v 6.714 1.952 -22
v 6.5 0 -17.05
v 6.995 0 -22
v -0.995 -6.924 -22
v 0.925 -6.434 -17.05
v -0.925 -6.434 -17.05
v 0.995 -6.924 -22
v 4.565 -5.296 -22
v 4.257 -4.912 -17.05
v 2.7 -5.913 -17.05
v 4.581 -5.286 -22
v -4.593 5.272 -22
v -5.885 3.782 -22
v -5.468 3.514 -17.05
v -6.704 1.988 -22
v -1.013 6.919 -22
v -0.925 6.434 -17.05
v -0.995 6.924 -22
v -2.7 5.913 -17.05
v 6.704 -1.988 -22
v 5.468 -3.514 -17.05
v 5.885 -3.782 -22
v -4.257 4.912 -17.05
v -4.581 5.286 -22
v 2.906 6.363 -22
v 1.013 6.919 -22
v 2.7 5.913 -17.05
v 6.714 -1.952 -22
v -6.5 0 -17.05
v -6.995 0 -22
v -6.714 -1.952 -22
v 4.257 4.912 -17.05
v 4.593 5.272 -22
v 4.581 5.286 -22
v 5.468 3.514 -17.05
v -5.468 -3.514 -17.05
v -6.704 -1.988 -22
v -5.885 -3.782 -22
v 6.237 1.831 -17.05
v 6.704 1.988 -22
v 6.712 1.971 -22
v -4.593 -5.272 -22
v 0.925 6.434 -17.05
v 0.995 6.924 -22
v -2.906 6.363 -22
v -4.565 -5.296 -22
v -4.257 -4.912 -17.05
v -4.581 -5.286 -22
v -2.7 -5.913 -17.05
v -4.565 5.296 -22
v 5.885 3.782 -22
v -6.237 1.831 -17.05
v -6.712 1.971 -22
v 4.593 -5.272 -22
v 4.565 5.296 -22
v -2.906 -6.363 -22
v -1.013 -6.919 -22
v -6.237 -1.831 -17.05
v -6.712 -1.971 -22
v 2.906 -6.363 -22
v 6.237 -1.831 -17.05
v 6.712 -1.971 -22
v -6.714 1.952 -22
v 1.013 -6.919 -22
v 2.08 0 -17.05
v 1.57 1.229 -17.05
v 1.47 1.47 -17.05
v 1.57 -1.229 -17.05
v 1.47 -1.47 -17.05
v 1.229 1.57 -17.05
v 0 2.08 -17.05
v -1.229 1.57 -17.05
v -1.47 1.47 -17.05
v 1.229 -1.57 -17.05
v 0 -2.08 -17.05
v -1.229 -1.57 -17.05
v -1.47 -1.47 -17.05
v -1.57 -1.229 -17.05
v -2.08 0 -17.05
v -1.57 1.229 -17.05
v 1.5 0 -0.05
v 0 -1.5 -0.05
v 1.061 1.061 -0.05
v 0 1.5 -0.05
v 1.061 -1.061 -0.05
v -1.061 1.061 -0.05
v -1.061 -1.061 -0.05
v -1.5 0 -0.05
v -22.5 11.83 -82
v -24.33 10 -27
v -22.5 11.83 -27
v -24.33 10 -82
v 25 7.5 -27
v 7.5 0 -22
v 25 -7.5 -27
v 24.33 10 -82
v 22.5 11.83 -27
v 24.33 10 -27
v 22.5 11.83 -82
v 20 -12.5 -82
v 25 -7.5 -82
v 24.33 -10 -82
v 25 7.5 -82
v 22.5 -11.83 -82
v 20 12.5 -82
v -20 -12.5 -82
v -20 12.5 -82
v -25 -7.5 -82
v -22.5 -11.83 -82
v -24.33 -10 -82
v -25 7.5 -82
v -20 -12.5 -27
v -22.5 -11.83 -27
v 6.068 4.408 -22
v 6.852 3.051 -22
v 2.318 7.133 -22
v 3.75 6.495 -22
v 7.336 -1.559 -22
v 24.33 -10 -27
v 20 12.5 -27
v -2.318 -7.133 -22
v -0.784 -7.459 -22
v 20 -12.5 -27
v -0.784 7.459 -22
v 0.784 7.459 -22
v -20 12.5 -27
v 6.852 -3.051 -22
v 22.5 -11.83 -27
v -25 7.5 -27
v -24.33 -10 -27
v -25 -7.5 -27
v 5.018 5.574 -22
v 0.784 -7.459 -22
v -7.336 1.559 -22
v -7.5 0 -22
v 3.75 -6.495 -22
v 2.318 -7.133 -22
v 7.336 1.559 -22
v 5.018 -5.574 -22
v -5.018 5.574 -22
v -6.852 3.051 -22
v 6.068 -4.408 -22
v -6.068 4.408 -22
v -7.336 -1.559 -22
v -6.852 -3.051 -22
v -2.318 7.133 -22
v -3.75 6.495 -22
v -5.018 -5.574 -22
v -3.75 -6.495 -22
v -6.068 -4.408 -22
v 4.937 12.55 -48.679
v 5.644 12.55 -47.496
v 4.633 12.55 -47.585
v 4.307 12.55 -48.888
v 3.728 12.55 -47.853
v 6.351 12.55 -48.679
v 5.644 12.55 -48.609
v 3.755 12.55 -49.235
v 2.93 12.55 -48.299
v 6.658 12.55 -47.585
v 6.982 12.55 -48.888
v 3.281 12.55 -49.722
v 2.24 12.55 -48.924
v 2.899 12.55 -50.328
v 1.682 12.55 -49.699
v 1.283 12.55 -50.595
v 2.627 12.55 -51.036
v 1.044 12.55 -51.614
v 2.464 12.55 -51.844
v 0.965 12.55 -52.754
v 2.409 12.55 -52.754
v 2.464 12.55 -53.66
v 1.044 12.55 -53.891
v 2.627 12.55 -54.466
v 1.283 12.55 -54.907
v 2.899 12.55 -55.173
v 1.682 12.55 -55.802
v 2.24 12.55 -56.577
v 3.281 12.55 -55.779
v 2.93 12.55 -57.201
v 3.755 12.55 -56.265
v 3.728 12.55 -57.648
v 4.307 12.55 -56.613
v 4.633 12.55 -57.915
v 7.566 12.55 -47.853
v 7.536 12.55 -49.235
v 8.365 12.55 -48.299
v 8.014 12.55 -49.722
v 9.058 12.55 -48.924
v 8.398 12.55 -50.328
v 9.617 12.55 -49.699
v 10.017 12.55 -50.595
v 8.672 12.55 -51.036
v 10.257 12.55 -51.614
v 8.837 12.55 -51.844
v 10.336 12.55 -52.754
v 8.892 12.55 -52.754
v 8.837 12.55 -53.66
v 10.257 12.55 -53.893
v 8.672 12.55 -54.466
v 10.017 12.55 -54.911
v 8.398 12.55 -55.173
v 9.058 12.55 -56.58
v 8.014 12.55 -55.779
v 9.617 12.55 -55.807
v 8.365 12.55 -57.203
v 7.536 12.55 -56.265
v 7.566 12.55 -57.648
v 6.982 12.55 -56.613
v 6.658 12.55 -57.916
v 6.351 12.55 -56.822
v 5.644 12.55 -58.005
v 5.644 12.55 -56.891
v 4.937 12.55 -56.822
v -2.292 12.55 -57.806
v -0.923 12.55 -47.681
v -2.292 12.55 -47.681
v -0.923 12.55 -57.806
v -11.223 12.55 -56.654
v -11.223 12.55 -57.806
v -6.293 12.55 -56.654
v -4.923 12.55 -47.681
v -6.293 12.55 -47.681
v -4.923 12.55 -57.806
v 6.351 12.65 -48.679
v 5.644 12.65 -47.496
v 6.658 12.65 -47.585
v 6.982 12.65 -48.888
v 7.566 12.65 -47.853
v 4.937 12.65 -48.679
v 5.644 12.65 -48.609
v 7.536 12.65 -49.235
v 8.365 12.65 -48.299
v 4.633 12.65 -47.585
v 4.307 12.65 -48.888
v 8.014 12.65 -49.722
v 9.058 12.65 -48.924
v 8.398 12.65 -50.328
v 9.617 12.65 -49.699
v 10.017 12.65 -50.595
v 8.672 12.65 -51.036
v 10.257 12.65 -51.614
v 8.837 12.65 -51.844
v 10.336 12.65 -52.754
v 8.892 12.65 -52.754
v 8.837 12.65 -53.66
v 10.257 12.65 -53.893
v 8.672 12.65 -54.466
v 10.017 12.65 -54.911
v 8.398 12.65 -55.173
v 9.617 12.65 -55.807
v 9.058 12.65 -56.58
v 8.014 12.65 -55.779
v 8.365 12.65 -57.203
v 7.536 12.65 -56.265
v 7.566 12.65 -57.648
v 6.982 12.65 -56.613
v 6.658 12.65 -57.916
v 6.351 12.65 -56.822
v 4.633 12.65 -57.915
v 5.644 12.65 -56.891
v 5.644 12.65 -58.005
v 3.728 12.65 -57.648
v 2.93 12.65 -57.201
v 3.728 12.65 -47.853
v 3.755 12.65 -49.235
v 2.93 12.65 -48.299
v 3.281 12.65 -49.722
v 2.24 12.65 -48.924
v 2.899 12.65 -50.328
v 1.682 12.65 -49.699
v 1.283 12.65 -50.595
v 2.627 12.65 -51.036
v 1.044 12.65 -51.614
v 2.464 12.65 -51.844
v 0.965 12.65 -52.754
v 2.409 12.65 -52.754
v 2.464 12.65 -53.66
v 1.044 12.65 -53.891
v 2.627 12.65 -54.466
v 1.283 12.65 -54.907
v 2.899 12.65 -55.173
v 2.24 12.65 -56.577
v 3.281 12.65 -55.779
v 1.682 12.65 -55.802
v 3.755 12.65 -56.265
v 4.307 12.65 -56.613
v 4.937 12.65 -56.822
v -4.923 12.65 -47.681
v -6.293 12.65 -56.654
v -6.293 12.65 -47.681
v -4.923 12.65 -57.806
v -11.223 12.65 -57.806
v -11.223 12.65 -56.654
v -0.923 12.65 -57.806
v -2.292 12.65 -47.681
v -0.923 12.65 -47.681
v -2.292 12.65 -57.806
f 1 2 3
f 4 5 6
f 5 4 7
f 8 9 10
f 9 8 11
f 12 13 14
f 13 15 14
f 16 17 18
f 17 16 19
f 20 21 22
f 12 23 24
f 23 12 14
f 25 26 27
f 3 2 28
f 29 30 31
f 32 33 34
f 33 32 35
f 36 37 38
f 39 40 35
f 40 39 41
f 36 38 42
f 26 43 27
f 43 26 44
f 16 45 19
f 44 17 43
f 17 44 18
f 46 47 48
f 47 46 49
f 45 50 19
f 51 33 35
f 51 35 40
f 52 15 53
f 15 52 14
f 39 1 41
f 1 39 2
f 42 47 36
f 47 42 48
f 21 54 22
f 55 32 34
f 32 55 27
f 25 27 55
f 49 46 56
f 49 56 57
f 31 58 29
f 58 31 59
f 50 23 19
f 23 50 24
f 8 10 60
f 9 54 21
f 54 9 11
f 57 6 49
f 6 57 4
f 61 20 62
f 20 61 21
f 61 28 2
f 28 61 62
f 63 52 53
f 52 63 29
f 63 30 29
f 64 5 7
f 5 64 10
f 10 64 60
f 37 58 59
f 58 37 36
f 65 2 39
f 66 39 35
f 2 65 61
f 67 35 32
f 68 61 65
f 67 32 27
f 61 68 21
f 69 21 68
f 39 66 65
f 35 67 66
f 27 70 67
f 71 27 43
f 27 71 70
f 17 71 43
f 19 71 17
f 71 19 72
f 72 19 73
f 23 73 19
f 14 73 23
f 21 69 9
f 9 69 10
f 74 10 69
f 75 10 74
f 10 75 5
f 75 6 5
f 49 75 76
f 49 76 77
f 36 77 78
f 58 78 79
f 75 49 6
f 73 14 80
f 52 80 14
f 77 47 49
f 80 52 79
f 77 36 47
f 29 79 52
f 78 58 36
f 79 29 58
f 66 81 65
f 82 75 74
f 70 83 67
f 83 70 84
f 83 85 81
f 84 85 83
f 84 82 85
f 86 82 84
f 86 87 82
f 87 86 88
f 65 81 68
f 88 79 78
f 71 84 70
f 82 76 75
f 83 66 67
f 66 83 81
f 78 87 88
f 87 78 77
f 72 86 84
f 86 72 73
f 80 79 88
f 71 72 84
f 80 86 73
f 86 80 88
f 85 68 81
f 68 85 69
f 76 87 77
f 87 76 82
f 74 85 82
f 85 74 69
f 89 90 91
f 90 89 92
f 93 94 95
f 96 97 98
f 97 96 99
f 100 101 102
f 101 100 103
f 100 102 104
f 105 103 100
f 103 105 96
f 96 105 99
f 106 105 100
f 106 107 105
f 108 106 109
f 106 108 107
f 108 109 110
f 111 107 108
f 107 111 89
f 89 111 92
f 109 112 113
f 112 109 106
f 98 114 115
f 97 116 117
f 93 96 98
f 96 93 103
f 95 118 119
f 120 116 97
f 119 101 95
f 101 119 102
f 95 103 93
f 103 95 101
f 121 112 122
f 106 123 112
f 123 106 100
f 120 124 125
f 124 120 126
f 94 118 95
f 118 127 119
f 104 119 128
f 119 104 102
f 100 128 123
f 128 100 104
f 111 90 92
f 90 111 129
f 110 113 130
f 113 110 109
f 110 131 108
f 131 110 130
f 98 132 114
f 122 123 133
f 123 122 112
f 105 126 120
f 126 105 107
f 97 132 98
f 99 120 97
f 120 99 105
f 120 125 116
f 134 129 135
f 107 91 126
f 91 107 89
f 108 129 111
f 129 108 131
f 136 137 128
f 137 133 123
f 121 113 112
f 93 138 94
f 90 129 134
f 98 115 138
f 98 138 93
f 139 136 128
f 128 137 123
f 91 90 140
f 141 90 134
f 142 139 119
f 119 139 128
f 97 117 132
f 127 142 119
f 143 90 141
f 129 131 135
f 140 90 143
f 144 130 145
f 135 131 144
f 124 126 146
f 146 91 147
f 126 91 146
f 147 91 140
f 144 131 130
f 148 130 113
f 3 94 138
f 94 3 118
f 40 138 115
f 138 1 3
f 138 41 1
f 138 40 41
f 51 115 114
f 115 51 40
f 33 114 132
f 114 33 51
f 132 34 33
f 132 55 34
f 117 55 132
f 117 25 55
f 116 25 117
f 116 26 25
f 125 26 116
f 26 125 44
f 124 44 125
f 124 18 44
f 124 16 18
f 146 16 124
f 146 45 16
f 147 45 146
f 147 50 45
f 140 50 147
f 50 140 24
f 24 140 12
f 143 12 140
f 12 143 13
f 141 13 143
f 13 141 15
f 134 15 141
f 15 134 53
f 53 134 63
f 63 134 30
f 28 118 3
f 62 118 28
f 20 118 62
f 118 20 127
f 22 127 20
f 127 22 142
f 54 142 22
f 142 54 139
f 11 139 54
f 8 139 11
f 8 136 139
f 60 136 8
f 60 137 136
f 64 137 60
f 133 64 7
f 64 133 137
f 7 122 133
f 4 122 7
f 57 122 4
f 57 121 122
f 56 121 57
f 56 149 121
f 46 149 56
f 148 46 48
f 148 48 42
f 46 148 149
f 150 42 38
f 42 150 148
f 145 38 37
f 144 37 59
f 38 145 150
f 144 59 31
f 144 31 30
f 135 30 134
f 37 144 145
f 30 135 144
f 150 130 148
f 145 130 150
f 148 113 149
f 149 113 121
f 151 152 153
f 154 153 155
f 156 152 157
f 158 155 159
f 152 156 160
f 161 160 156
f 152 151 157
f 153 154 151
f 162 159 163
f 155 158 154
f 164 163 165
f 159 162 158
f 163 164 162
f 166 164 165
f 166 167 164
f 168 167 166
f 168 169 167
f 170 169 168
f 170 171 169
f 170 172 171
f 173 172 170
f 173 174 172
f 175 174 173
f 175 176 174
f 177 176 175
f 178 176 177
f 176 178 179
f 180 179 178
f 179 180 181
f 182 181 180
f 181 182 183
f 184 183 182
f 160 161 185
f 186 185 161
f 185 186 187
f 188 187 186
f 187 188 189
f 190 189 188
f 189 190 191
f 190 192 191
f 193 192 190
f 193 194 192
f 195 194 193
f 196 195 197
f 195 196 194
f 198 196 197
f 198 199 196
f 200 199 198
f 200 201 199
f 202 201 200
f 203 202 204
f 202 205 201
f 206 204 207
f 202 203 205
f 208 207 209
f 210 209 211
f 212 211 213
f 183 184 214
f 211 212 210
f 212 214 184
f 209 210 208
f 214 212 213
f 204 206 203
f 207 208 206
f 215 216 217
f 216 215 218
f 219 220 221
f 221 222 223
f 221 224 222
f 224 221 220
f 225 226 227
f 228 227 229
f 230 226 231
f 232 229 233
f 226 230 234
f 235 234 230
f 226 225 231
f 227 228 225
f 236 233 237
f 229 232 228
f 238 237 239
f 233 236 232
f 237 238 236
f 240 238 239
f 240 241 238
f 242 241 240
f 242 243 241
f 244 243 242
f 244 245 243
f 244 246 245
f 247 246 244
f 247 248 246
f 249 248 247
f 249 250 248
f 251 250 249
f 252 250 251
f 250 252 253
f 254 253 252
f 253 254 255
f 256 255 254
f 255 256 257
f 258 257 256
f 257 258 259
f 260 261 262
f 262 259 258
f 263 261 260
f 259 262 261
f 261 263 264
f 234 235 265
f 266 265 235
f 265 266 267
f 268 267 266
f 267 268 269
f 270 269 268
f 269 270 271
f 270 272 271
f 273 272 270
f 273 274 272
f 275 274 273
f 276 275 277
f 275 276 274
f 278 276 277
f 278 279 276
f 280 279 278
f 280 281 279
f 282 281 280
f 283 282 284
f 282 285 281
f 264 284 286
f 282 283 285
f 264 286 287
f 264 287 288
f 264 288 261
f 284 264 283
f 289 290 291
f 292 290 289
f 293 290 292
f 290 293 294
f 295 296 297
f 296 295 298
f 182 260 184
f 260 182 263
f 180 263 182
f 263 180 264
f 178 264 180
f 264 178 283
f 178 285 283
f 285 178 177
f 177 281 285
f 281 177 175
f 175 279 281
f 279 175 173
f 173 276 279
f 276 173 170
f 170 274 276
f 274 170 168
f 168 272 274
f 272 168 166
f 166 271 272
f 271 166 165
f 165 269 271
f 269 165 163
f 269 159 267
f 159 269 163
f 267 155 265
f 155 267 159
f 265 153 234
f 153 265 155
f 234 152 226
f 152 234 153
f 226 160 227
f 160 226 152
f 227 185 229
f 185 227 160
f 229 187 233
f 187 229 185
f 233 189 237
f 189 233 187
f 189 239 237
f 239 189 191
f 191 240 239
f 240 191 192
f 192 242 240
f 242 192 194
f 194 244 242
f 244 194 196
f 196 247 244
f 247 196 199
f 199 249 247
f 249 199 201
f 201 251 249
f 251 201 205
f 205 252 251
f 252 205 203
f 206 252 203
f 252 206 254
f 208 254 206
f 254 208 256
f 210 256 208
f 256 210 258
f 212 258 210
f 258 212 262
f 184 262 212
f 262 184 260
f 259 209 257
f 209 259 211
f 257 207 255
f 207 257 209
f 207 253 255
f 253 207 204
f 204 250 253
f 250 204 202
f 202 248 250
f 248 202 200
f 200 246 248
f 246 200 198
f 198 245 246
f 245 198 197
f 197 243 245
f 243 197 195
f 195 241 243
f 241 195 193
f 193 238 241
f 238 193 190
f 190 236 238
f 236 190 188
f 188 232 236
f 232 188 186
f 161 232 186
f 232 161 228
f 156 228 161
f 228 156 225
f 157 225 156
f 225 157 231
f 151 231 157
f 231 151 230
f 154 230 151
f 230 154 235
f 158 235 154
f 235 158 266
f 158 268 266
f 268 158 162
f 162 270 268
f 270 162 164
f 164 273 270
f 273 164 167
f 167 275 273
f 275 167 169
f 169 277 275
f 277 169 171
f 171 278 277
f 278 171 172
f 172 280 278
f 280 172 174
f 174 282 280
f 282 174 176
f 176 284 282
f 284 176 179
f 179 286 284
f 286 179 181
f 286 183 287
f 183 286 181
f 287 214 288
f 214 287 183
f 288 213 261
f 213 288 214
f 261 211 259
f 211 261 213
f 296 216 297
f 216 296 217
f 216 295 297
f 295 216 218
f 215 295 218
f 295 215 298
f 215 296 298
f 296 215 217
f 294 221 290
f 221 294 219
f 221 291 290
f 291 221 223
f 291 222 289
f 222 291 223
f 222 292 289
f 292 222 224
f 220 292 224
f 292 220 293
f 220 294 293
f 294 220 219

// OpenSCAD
// file: ../../openscad/libs/libdict.scad
// This library add dictionary like features to openscad
// the dictionary is a list of pairs as we cannot define new types.
// Unlike a python dictionary we cannot do a proper hash table for speed
// so everything is build around the OpenSCAD search function
// There are a lot of assert statements to ensure data in the "dictionary"
// is in the format of
// * A list of lists
// * Each internal list has a length of two
// * First element of each internal list is a string (the key)
// * All keys are unique.


// Private function:
// This function returns true if the value is in the list
// value must be a string.
// No error checking, for use by is_in only!
function _is_in_str(value, list) =
    search([value], list) != [[]];

// Private function:
// This function returns true if the value is in the list
// value must be a number.
// No error checking, for use by is_in only!
function _is_in_num(value, list) =
    search(value, list) != [];


// This function returns true if the value is in the list
// value must be a string or a number.
function is_in(value, list) =
    assert(is_num(value) || is_string(value) , "is_in: value must be a number or string")
    assert(is_list(list), "is_in: list must be a list")
    is_num(value) ? _is_in_num(value, list) : _is_in_str(value, list);

/**
 * Sum a list
 * This recursive function sums a list.  It should be called with one
 * argument (the list); the other two arguments simply allow it to be
 * "tail-recursive" which lets OpenSCAD optimise it better.  This is
 * very close to the example given in the OpenSCAD docs.
 */
function _libdict_sum_list(list, starting_element=0, running_total=0) = 
    starting_element >= len(list) ?
        running_total :
        _libdict_sum_list(list, starting_element + 1, running_total + list[starting_element]);

/**
 * When checking a list for uniqueness, we can get "errant matches".
 * An errant match is when a non-list matches with the first element in a list.
 * i.e. it would consider [1, [1,0]] to be non-unique. We cannot know which 
 * element is the non-list but we do know that it is errant if exactly one 
 * of them is not a list.
 * If two elements are non-lists, they must be identical in order to have matched.  
 * Similarly, if all elements are lists, they must be identical because ``search`` 
 * will have matched them as whole lists.
 * The argument "list" is the list we are checking for uniqueness, and "match" is 
 * a vector of indices that have been returned by ``search``.
 */
function _check_errant_match(list, match) = let(
    non_list = [for (m = match) is_list(list[m])? 0 : 1],
    number_of_non_lists = _libdict_sum_list(non_list)
) number_of_non_lists == 1 ? 0 : 1;

// Returns true if all emements in list are unique.
function is_unique(list) =
    assert(is_list(list), "is_unique: list must be a list")
    let(
        matches = search(list, list, 0),
        // Assign 1 or 0 depending on is the match length for each element
        // return wether any matches are greater than one (mathcing more than
        // itself)
        // note cannot search for true or false so using 1 and zero
        bool_list = [for (match = matches) if (len(match)==1) 0
            // should put a 1 here to show they matched but in the case of
            // [1, [1]] it will match both, so need to check if they are
            // both lists or both not list
            else _check_errant_match(list, match)]
    ) !is_in(1, bool_list);

// Private function:
// Checks that the input is a list and that every element is a list
// of length 2.
// No error checking, for use by valid_dict only!
function _is_pairs(list) =
    !is_list(list) ? false :
        len(list)==0 ? false :
            !is_in(0, [for (pair = list) is_list(pair) && len(pair)==2 ? 1: 0]);

// Private function:
// Checks all elements in the list are strings
// No error checking, for use by valid_dict only!
// Strings can't be empty
function _is_list_of_strings(list) =
    !is_in(0, [for (item = list) is_string(item) && len(item)>0 ? 1: 0]);

// Private function:
// Returns the keus in a dictionary
// No error checking, for use by valid_dict only!
function _keylist(dict)  = [for (pair=dict) pair[0]];

function valid_dict(dict) =
    //if the input are not pairs return instantly
    !_is_pairs(dict) ? false : let (
        //if they are pairs get all keys
        keys = _keylist(dict),
        all_strings =  _is_list_of_strings(keys),
        unique = is_unique(keys)
    ) (all_strings && unique) ? true : false;

// Key lookup for key value pair "dictionary".
// Unlike the built in lookup this works with strings.
function key_lookup(key, dict) =
    assert(is_string(key), "`key` must be a string")
    assert(valid_dict(dict), "`dict` must be a valid 'dictionary'")
    let(
        // key is in [] because otherwise openscad will search for each letter rather than the string.
        index = search([key], dict, 1, 0)[0]
    )  assert (index!=[], "Key lookup failed, key not found!") dict[index][1];

// Creates a new dictionary with a key value pair replaced. Pair must already
// be in dictionary.
function replace_value(key, value, dict) =
    assert(is_string(key), "`key` must be a string")
    assert(valid_dict(dict), "`dict` must be a valid 'dictionary'")
    assert(is_in(key, _keylist(dict)), "`key` not found in dictionary!")
    [for (kv_pair = dict) key!=kv_pair[0] ? kv_pair : [key, value]];


// Creates a new dictionary with a a set of key value pair replaced
// both inputs must be a dictionary. All keys in input must already be
// in dictionary
function replace_multiple_values(rep_dict, dict) =
    assert(valid_dict(rep_dict), "`rep dict` must be a valid 'dictionary'")
    assert(valid_dict(dict), "`dict` must be a valid 'dictionary'")
    let(
        // loop over all keys in replacement dict checking they are in the original
        rep_keys = [for (key = _keylist(rep_dict))
            assert(is_in(key, _keylist(dict)), "`key` not found in dictionary!")
            key
        ]
    ) //Finally return the updated dictionary using this long list comprehension.
    [
        for (kv_pair = dict) let(
            key = kv_pair[0],
            // check if this key is in the replacement dictionary and if so return index
            // key is in [] because otherwise openscad will search for each letter rather
            // than the string.
            index = search([key], rep_dict, 1, 0)[0]
            // if index is empty return original key value pair, else return the key with
            // the replaced value
        ) index == [] ? kv_pair : [key, rep_dict[index][1]]
    ];
// file: render_utils.scad
use <../../openscad/libs/microscope_parameters.scad>
use <../../openscad/libs/libdict.scad>
use <../../openscad/libs/utilities.scad>

module construction_line(p1, p2, width=0.1, line_color="Black"){
    //draws a construction line between two points. Inputs can be x,y,z list or placement dictionary

    //If placment dictionaries are used then recall using vector
    if (valid_dict(p1)){
        construction_line(key_lookup("translation", p1), p2, width=width, line_color=line_color);
    }else{
        if (valid_dict(p2)){
            construction_line(p1, key_lookup("translation", p2), width=width, line_color=line_color);
        }else{
            color(line_color){
                hull(){
                    translate(p1){
                        cube([width, width, width], center=true);
                    }
                    translate(p2){
                        cube([width, width, width], center=true);
                    }
                }
            }
        }
    }
}

module turn_anticlockwise(rad = 5, head = 2.5){
    color("black"){
        rotate_extrude(angle=270, $fn=80){
            translate_x(rad){
                circle(r = 0.1);
            }
        }
        translate_y(-rad){
            rotate_y(90){
                cylinder(d1=head*2/3, d2=0.01, h=head, $fn=80);
            }
        }
    }
}

module turn_clockwise(rad = 5, head = 2.5){
    mirror([0, 1, 0]){
        turn_anticlockwise(rad, head);
    }
}


function create_placement_dict(translation=[0,0,0],
                               rotation3=[0,0,0],
                               rotation2=[0,0,0],
                               rotation1=[0,0,0]) = [["translation",translation],
                                                     ["rotation3",rotation3],
                                                     ["rotation2",rotation2],
                                                     ["rotation1",rotation1]];

function translate_pos(placement_dict, translation) = let(
    tr = key_lookup("translation", placement_dict) + translation
) replace_value("translation", tr, placement_dict);

module place_part(position){
    if (valid_dict(position)){
        // Places part in 3D space
        // input is a dictionary with keys translation, rotation3, rotation2, rotation1, translation
        // These will be applied in order allowing full ridgidbody rotation before translation
        tr = key_lookup("translation", position);
        r1 = key_lookup("rotation1", position);
        r2 = key_lookup("rotation2", position);
        r3 = key_lookup("rotation3", position);
        translate(tr){
            rotate(r3){
                rotate(r2){
                    rotate(r1){
                        children();
                    }
                }
            }
        }
    }
    else{
        translate(position){
            children();
        }
    }
}

module coloured_render(colour="Red", convexity=6){
    color(colour){
        render(convexity){
            children();
        }
    }
}

module cutaway(dir="+x", colour="Red"){
    if (dir == "none"){
        coloured_render(colour){
            children();
        }
    }
    else{
        rotations = [["x", [0, 90, 0]],
                    ["+x", [0, 90, 0]],
                    ["-x", [0, -90, 0]],
                    ["y", [-90, 0, 0]],
                    ["+y", [-90, 0, 0]],
                    ["-y", [90, 0, 0]],
                    ["z", [0, 0, 0]],
                    ["+z", [0, 0, 0]],
                    ["-z", [0, 180, 0]]];
        rotation = key_lookup(dir, rotations);
        coloured_render(colour){
            difference(){
                children();
                rotate(rotation){
                    cylinder(r=999,h=999,$fn=4); //cutaway
                }
            }
        }
    }
}
// main file
use <../../openscad/libs/utilities.scad>
use <render_utils.scad>

oil_bottle();

module oil_bottle(){
    bottle_size = [50, 25, 60];
    nozzle_height = 22;
    neck_d=15;
    translate_z(-bottle_size.z-nozzle_height){
        coloured_render("DarkGreen"){
            outer_oil_bottle(bottle_size, neck_d=neck_d);
        }
        coloured_render("Red"){
            translate_z(bottle_size.z-tiny()){
                cylinder(d1=neck_d-1, d2=neck_d-2, h=5);
                cylinder(d1=4.5, d2=3, h=nozzle_height);
            }
        }
        rotate_z(180){
            coloured_render("White"){
                translate([0, -bottle_size.y/2-tiny(), bottle_size.z*.4]){
                    rotate_x(90){
                        linear_extrude(2*tiny()){
                            text("OIL",
                                size=10,
                                font="Sans",
                                halign="center",
                                valign="bottom");
                        }
                    }
                }
            }
        }
    }
}

module outer_oil_bottle(size, rad = 5, neck_d=15){
    abs_x_tr = size.x/2-rad;
    x_trs = [-abs_x_tr, abs_x_tr];
    abs_y_tr = size.y/2-rad;
    y_trs = [-abs_y_tr, abs_y_tr];
    hull(){
        for (x_tr = x_trs, y_tr = y_trs){
            translate([x_tr, y_tr, 0]){
                cylinder(r=rad, h=size.z-5, $fn=12);
            }
            
        }
        cylinder(d=neck_d, h=size.z, $fn=30);
    }
}
